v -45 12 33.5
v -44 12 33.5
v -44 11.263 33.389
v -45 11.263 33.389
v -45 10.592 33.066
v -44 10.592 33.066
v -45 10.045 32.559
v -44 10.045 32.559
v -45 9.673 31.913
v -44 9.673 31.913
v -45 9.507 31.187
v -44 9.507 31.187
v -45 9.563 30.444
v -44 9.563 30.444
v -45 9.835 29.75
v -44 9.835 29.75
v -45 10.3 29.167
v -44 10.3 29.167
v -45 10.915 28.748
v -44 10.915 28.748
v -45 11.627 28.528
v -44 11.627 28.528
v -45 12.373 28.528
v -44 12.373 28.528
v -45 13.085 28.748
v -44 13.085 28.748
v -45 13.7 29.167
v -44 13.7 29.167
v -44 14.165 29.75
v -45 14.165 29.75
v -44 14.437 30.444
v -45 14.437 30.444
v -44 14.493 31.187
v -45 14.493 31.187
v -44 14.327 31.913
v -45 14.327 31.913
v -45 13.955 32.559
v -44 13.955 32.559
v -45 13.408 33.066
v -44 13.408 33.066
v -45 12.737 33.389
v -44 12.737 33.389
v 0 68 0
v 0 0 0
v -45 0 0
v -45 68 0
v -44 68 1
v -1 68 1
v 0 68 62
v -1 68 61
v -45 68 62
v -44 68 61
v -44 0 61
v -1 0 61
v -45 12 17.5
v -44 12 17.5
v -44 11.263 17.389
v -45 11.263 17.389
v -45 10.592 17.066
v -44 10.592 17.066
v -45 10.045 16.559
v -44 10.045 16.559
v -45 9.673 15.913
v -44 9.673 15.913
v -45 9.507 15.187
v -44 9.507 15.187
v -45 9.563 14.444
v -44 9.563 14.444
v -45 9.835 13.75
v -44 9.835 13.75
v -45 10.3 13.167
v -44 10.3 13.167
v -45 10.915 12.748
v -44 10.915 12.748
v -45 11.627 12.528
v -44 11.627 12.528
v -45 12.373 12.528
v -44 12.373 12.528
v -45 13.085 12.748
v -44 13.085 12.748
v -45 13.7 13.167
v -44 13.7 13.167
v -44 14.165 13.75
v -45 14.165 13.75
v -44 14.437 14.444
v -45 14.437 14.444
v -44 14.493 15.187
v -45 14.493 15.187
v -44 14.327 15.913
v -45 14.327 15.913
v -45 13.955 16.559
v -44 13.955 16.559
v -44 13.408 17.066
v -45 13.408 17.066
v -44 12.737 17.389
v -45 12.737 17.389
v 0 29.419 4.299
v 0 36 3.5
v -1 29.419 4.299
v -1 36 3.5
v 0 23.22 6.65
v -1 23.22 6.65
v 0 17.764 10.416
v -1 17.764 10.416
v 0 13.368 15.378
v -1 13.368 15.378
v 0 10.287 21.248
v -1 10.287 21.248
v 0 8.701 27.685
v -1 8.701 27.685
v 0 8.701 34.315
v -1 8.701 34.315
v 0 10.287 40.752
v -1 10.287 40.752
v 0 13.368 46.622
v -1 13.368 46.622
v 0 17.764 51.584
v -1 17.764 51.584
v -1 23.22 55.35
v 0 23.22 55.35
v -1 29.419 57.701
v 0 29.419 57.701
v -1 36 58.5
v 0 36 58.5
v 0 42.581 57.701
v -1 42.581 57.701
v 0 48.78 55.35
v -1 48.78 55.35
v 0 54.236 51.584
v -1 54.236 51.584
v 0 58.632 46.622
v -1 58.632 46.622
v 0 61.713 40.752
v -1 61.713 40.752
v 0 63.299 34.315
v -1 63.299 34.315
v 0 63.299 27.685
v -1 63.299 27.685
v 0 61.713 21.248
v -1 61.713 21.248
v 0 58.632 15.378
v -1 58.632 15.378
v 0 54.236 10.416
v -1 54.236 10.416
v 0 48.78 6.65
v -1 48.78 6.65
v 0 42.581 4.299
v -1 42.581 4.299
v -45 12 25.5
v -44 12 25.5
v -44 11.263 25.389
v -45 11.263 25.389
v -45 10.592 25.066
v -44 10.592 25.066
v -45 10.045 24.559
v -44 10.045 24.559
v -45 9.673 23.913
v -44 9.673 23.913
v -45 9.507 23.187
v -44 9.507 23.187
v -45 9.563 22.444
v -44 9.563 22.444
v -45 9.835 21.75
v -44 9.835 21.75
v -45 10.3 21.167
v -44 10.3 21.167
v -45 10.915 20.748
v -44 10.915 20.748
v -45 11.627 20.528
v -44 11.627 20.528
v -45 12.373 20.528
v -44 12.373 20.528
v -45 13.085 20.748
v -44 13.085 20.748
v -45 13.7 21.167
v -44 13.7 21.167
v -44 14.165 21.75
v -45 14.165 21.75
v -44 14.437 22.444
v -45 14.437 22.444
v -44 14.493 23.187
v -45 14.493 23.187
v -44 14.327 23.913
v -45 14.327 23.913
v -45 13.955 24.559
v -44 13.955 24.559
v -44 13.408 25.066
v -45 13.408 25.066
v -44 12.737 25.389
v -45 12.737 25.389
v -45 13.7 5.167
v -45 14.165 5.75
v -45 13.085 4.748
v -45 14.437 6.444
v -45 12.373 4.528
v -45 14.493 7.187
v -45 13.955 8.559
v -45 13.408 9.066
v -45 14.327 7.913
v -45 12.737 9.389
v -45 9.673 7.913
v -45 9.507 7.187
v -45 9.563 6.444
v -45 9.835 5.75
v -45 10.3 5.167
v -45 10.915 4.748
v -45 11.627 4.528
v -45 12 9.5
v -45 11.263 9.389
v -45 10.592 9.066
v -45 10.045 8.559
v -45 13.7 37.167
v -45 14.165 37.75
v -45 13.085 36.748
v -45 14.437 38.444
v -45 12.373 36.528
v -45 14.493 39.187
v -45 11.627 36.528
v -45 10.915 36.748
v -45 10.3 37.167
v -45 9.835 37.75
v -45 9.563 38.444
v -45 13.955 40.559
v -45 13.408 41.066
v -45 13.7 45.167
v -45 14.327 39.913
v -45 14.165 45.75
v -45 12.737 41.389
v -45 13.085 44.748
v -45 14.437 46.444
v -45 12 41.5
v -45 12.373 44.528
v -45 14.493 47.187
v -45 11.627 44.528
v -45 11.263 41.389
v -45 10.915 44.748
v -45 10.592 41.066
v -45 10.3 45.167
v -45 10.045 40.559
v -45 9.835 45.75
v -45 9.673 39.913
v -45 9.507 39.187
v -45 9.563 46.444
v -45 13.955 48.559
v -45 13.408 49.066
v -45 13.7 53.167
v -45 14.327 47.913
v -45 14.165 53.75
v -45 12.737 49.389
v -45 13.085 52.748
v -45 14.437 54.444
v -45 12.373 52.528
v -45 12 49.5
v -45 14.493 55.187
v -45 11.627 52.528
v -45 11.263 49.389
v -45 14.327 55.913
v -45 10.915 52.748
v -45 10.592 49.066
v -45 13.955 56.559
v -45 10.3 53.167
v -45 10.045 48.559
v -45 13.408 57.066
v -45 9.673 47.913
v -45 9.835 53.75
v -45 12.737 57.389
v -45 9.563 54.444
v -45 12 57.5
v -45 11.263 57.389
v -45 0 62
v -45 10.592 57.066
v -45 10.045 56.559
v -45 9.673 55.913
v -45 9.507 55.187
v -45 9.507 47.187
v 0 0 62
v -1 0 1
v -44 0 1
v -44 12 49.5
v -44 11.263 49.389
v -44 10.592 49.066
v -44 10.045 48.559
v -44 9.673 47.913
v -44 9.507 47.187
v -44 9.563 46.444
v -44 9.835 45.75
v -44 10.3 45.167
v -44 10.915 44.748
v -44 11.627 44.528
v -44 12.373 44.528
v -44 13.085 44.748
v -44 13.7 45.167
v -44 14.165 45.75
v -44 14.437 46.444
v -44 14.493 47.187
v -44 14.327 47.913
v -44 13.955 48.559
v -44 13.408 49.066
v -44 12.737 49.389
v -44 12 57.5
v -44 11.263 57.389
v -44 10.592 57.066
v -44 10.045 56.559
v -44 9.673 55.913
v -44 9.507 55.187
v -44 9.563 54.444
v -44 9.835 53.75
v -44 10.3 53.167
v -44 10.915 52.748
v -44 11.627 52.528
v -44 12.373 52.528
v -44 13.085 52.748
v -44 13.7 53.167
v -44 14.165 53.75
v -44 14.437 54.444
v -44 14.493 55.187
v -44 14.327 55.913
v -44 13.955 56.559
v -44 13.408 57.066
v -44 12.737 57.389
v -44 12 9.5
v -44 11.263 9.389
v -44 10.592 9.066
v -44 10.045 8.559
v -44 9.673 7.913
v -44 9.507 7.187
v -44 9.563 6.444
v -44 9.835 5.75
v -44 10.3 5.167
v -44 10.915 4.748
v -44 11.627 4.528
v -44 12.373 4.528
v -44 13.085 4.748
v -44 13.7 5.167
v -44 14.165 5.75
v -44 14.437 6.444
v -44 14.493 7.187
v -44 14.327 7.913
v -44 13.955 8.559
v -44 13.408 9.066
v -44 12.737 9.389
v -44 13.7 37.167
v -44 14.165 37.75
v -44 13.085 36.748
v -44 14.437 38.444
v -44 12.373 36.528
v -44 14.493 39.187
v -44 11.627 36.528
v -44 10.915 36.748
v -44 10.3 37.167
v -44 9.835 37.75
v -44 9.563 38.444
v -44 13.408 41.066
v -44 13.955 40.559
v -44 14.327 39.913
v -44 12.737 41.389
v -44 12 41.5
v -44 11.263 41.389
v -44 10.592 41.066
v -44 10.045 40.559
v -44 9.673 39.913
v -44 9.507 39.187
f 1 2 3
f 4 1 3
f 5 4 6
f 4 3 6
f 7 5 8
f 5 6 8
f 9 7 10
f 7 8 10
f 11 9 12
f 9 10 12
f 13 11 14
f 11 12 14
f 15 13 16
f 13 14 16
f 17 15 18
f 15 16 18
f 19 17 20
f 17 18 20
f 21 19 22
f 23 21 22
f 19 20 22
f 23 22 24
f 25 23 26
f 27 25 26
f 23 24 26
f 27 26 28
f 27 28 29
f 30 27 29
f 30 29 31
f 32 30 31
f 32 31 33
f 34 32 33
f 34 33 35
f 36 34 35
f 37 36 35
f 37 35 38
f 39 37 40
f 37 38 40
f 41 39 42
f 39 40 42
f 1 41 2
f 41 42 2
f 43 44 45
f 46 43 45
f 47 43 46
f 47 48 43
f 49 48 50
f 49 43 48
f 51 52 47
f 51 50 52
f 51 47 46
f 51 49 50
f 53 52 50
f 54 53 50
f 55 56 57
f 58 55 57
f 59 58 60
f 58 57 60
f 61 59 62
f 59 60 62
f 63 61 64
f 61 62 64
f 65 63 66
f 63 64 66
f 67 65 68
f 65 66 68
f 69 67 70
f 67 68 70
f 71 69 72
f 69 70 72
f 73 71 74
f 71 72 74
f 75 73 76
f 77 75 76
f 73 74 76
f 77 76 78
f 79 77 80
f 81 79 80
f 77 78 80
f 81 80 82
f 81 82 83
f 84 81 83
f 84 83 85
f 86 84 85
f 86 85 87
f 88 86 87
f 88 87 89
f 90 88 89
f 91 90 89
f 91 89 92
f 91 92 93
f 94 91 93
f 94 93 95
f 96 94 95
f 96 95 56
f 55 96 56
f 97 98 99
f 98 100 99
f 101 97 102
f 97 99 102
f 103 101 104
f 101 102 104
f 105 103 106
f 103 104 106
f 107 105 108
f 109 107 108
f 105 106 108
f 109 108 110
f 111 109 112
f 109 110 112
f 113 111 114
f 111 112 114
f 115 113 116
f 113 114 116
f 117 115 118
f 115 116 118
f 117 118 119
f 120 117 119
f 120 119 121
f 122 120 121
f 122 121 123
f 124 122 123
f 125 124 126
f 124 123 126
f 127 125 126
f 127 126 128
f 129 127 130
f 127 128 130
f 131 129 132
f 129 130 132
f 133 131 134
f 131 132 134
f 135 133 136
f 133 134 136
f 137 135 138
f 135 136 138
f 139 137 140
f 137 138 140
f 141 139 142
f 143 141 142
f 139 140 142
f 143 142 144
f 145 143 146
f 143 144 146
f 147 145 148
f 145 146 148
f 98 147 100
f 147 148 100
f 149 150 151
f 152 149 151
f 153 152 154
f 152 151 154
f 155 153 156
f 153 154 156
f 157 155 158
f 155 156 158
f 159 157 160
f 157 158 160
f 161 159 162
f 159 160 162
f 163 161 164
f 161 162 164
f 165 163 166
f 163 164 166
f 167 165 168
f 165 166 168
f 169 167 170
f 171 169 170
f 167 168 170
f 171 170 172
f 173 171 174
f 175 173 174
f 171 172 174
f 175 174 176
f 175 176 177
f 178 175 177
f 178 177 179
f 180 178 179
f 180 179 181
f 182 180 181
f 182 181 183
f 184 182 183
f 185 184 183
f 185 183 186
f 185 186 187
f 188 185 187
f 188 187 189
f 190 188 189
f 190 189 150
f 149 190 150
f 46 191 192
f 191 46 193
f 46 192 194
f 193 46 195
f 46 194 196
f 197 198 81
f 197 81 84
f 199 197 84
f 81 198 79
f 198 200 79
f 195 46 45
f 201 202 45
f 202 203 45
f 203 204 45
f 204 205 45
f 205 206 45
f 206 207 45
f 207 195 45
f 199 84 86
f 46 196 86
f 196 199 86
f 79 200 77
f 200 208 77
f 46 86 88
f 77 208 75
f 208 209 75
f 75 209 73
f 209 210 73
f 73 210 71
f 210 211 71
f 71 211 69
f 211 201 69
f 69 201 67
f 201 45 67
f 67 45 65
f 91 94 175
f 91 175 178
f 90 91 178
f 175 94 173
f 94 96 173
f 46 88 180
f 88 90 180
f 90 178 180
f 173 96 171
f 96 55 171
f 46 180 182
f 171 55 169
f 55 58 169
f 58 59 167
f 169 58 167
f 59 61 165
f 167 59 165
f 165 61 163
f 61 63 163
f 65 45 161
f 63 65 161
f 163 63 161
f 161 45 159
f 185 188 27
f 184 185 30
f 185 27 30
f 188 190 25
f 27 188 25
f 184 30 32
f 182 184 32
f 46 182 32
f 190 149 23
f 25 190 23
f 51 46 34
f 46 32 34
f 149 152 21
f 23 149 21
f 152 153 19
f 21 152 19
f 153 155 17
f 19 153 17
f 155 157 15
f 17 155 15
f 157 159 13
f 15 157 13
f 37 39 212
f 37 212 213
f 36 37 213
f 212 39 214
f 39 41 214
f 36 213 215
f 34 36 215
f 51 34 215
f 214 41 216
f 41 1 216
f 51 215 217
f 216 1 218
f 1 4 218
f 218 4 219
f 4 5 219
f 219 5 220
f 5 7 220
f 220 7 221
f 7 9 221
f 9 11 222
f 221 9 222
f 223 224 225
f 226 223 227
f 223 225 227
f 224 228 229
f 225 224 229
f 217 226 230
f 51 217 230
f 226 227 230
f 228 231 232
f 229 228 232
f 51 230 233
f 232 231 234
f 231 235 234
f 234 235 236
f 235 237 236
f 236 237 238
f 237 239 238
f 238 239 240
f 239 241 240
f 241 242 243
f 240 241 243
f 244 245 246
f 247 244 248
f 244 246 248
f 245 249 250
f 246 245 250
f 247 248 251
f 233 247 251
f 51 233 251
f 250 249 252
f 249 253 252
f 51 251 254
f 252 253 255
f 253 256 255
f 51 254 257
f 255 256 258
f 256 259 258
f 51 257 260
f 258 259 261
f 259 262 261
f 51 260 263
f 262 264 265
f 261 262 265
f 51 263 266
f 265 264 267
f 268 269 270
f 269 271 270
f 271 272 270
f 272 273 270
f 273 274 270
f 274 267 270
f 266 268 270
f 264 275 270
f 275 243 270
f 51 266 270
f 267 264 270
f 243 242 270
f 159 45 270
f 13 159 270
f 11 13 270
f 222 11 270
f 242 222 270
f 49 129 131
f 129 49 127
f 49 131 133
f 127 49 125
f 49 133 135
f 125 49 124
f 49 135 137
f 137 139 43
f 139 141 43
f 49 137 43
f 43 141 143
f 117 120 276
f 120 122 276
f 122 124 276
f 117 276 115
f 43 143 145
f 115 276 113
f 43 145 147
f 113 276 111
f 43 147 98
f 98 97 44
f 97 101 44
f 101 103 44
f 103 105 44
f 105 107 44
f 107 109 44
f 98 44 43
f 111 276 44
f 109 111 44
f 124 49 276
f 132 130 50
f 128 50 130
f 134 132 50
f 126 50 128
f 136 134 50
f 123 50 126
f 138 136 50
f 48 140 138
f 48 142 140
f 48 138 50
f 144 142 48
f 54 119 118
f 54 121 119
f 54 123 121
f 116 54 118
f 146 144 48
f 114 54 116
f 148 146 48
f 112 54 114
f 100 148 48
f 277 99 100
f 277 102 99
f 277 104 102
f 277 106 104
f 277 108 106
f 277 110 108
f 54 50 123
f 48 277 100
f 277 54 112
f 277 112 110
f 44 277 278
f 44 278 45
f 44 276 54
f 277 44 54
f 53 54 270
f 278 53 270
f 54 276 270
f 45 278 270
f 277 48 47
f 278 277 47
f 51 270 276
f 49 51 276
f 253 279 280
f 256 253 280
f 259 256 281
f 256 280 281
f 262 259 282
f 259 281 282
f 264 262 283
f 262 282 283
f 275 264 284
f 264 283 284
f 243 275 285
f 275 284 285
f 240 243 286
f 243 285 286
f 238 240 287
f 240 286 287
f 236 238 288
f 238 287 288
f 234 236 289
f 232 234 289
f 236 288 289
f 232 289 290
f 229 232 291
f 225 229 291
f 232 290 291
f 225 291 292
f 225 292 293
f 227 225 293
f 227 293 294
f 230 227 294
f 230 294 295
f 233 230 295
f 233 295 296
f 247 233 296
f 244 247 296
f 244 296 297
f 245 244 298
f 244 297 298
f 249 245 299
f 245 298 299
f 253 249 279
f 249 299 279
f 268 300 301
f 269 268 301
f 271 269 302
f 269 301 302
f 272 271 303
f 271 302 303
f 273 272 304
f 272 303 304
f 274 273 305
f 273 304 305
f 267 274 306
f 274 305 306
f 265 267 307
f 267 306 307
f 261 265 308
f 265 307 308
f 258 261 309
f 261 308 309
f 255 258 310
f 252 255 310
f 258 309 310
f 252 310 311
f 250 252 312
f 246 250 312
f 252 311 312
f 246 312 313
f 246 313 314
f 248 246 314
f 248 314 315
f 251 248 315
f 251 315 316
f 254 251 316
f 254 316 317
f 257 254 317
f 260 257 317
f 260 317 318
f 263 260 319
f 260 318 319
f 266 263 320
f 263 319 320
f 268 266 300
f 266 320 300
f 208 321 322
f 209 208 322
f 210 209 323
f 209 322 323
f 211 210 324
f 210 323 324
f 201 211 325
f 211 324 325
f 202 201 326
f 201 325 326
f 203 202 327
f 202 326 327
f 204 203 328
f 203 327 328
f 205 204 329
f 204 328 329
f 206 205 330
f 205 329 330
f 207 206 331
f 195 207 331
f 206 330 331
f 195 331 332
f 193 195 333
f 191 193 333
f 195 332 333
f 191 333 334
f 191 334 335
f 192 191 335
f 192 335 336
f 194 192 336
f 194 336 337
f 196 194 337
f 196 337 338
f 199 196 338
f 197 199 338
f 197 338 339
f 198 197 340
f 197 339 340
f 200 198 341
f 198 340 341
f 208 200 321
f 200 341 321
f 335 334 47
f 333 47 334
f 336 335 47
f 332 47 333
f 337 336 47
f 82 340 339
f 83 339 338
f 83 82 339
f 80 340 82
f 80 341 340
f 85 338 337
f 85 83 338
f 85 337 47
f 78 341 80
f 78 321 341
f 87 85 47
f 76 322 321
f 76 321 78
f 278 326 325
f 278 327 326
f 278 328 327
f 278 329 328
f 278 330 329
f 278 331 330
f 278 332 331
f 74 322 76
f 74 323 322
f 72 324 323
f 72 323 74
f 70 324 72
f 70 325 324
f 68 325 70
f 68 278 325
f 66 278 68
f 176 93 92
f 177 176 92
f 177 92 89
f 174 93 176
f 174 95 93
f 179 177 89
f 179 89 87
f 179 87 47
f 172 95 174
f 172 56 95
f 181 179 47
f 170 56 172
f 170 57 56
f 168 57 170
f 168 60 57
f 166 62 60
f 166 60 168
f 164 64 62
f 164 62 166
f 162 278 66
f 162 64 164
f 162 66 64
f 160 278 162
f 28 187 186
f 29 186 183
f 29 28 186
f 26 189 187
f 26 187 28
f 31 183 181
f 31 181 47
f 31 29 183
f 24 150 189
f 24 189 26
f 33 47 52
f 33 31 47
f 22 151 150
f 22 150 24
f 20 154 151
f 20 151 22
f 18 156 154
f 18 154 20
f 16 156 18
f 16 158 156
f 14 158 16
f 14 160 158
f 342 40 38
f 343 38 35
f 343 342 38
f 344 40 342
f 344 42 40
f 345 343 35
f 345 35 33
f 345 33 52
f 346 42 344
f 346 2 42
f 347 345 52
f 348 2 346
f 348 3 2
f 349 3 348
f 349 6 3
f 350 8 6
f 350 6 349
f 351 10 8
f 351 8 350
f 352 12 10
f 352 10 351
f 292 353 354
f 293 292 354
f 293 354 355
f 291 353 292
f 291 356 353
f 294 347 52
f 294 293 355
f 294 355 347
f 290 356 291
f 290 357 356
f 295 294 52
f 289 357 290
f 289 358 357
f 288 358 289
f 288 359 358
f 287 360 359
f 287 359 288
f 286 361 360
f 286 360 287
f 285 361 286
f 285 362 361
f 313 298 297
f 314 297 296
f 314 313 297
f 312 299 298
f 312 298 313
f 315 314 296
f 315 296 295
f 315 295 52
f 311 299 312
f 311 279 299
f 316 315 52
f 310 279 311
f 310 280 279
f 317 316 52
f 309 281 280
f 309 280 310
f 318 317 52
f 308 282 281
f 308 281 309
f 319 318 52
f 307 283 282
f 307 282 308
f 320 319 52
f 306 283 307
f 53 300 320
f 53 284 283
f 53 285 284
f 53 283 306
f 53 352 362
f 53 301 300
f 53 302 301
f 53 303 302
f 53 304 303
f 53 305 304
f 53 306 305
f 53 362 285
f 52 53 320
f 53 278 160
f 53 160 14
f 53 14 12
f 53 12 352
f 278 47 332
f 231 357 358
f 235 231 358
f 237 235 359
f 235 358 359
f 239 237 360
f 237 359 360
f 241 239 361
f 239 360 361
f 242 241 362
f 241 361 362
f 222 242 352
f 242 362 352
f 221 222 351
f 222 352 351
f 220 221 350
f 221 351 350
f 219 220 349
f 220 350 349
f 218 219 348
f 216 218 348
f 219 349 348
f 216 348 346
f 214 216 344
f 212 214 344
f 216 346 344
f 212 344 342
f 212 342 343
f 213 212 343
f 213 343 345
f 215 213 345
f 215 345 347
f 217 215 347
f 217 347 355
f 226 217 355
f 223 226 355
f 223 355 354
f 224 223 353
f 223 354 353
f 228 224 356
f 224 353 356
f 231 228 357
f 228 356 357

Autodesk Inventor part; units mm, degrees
ref_plane "YZ Plane" through (0, 0, 0) normal (1, 0, 0) x (0, 1, 0)
ref_plane "XZ Plane" through (0, 0, 0) normal (0, 1, 0) x (-1, 0, 0)
ref_plane "XY Plane" through (0, 0, 0) normal (0, 0, 1) x (1, 0, 0)
sketch "Boceto1" plane through (0, 0, 0) normal (0, 1, 0) x (-1, 0, 0)
  line L0 (0, 0) -> (45, 0)
  line L1 (45, 0) -> (45, 62)
  line L2 (45, 62) -> (0, 62)
  line L3 (0, 62) -> (0, 0)
  line L4 (44, 61) -> (1, 61)
  line L5 (1, 61) -> (1, 1)
  line L6 (1, 1) -> (44, 1)
  line L7 (44, 1) -> (44, 61)
  point P0 (22.5, 62)
  dimension "d0" = 1
  dimension "d1" = 1
  dimension "d2" = 1
  dimension "d3" = 1
  dimension "d4" = 43
  dimension "d5" = 60
extrude "Extrusión1" add sketch "Boceto1" along normal blind 68
sketch "Boceto2" plane through (0, 0, 62) normal (1, 0, 0) x (0, 0, -1)
  line L0 (0, 0) -> (62, 0) projected
  line L1 (62, 0) -> (62, 68) projected
  line L2 (0, 68) -> (62, 68) projected
  line L3 (0, 0) -> (0, 68) projected
  circle A0 centre (31, 36) radius 27.5
  point P0 (31, 68)
  dimension "d8" = 36
  dimension "d9" = 55
hole "Agujero1" at (0, 36, 31) direction (-1, 0, 0) diameter 55 depth 1
sketch "Boceto3" plane through (-45, 0, 0) normal (-1, 0, 0) x (0, 0, 1)
  line L0 (0, 0) -> (62, 0) projected
  line L1 (62, 0) -> (62, 68) projected
  line L2 (0, 68) -> (62, 68) projected
  line L3 (0, 0) -> (0, 68) projected
  circle A0 centre (31, 12) radius 2.5
  circle A1 centre (7, 12) radius 2.5
  circle A2 centre (55, 12) radius 2.5
  circle A3 centre (15, 12) radius 2.5
  circle A4 centre (23, 12) radius 2.5
  circle A5 centre (39, 12) radius 2.5
  circle A6 centre (47, 12) radius 2.5
  point P0 (0, 0)
  point P1 (31, 68)
  dimension "d17" = 5
  dimension "d18" = 12
  dimension "d19" = 5
  dimension "d20" = 5
  dimension "d21" = 24
  dimension "d22" = 48
  dimension "d24" = 3
  dimension "d25" = 3
  dimension "d26" = 3
  dimension "d27" = 3
  dimension "d28" = 3
hole "Agujero2" at (-45, 12, 7) at (-45, 12, 15) at (-45, 12, 23) at (-45, 12, 31) at (-45, 12, 39) at (-45, 12, 47) at (-45, 12, 55) direction (1, 0, 0) diameter 5 depth 1
properties part number "7-32" material "Latón, amarillo claro"
